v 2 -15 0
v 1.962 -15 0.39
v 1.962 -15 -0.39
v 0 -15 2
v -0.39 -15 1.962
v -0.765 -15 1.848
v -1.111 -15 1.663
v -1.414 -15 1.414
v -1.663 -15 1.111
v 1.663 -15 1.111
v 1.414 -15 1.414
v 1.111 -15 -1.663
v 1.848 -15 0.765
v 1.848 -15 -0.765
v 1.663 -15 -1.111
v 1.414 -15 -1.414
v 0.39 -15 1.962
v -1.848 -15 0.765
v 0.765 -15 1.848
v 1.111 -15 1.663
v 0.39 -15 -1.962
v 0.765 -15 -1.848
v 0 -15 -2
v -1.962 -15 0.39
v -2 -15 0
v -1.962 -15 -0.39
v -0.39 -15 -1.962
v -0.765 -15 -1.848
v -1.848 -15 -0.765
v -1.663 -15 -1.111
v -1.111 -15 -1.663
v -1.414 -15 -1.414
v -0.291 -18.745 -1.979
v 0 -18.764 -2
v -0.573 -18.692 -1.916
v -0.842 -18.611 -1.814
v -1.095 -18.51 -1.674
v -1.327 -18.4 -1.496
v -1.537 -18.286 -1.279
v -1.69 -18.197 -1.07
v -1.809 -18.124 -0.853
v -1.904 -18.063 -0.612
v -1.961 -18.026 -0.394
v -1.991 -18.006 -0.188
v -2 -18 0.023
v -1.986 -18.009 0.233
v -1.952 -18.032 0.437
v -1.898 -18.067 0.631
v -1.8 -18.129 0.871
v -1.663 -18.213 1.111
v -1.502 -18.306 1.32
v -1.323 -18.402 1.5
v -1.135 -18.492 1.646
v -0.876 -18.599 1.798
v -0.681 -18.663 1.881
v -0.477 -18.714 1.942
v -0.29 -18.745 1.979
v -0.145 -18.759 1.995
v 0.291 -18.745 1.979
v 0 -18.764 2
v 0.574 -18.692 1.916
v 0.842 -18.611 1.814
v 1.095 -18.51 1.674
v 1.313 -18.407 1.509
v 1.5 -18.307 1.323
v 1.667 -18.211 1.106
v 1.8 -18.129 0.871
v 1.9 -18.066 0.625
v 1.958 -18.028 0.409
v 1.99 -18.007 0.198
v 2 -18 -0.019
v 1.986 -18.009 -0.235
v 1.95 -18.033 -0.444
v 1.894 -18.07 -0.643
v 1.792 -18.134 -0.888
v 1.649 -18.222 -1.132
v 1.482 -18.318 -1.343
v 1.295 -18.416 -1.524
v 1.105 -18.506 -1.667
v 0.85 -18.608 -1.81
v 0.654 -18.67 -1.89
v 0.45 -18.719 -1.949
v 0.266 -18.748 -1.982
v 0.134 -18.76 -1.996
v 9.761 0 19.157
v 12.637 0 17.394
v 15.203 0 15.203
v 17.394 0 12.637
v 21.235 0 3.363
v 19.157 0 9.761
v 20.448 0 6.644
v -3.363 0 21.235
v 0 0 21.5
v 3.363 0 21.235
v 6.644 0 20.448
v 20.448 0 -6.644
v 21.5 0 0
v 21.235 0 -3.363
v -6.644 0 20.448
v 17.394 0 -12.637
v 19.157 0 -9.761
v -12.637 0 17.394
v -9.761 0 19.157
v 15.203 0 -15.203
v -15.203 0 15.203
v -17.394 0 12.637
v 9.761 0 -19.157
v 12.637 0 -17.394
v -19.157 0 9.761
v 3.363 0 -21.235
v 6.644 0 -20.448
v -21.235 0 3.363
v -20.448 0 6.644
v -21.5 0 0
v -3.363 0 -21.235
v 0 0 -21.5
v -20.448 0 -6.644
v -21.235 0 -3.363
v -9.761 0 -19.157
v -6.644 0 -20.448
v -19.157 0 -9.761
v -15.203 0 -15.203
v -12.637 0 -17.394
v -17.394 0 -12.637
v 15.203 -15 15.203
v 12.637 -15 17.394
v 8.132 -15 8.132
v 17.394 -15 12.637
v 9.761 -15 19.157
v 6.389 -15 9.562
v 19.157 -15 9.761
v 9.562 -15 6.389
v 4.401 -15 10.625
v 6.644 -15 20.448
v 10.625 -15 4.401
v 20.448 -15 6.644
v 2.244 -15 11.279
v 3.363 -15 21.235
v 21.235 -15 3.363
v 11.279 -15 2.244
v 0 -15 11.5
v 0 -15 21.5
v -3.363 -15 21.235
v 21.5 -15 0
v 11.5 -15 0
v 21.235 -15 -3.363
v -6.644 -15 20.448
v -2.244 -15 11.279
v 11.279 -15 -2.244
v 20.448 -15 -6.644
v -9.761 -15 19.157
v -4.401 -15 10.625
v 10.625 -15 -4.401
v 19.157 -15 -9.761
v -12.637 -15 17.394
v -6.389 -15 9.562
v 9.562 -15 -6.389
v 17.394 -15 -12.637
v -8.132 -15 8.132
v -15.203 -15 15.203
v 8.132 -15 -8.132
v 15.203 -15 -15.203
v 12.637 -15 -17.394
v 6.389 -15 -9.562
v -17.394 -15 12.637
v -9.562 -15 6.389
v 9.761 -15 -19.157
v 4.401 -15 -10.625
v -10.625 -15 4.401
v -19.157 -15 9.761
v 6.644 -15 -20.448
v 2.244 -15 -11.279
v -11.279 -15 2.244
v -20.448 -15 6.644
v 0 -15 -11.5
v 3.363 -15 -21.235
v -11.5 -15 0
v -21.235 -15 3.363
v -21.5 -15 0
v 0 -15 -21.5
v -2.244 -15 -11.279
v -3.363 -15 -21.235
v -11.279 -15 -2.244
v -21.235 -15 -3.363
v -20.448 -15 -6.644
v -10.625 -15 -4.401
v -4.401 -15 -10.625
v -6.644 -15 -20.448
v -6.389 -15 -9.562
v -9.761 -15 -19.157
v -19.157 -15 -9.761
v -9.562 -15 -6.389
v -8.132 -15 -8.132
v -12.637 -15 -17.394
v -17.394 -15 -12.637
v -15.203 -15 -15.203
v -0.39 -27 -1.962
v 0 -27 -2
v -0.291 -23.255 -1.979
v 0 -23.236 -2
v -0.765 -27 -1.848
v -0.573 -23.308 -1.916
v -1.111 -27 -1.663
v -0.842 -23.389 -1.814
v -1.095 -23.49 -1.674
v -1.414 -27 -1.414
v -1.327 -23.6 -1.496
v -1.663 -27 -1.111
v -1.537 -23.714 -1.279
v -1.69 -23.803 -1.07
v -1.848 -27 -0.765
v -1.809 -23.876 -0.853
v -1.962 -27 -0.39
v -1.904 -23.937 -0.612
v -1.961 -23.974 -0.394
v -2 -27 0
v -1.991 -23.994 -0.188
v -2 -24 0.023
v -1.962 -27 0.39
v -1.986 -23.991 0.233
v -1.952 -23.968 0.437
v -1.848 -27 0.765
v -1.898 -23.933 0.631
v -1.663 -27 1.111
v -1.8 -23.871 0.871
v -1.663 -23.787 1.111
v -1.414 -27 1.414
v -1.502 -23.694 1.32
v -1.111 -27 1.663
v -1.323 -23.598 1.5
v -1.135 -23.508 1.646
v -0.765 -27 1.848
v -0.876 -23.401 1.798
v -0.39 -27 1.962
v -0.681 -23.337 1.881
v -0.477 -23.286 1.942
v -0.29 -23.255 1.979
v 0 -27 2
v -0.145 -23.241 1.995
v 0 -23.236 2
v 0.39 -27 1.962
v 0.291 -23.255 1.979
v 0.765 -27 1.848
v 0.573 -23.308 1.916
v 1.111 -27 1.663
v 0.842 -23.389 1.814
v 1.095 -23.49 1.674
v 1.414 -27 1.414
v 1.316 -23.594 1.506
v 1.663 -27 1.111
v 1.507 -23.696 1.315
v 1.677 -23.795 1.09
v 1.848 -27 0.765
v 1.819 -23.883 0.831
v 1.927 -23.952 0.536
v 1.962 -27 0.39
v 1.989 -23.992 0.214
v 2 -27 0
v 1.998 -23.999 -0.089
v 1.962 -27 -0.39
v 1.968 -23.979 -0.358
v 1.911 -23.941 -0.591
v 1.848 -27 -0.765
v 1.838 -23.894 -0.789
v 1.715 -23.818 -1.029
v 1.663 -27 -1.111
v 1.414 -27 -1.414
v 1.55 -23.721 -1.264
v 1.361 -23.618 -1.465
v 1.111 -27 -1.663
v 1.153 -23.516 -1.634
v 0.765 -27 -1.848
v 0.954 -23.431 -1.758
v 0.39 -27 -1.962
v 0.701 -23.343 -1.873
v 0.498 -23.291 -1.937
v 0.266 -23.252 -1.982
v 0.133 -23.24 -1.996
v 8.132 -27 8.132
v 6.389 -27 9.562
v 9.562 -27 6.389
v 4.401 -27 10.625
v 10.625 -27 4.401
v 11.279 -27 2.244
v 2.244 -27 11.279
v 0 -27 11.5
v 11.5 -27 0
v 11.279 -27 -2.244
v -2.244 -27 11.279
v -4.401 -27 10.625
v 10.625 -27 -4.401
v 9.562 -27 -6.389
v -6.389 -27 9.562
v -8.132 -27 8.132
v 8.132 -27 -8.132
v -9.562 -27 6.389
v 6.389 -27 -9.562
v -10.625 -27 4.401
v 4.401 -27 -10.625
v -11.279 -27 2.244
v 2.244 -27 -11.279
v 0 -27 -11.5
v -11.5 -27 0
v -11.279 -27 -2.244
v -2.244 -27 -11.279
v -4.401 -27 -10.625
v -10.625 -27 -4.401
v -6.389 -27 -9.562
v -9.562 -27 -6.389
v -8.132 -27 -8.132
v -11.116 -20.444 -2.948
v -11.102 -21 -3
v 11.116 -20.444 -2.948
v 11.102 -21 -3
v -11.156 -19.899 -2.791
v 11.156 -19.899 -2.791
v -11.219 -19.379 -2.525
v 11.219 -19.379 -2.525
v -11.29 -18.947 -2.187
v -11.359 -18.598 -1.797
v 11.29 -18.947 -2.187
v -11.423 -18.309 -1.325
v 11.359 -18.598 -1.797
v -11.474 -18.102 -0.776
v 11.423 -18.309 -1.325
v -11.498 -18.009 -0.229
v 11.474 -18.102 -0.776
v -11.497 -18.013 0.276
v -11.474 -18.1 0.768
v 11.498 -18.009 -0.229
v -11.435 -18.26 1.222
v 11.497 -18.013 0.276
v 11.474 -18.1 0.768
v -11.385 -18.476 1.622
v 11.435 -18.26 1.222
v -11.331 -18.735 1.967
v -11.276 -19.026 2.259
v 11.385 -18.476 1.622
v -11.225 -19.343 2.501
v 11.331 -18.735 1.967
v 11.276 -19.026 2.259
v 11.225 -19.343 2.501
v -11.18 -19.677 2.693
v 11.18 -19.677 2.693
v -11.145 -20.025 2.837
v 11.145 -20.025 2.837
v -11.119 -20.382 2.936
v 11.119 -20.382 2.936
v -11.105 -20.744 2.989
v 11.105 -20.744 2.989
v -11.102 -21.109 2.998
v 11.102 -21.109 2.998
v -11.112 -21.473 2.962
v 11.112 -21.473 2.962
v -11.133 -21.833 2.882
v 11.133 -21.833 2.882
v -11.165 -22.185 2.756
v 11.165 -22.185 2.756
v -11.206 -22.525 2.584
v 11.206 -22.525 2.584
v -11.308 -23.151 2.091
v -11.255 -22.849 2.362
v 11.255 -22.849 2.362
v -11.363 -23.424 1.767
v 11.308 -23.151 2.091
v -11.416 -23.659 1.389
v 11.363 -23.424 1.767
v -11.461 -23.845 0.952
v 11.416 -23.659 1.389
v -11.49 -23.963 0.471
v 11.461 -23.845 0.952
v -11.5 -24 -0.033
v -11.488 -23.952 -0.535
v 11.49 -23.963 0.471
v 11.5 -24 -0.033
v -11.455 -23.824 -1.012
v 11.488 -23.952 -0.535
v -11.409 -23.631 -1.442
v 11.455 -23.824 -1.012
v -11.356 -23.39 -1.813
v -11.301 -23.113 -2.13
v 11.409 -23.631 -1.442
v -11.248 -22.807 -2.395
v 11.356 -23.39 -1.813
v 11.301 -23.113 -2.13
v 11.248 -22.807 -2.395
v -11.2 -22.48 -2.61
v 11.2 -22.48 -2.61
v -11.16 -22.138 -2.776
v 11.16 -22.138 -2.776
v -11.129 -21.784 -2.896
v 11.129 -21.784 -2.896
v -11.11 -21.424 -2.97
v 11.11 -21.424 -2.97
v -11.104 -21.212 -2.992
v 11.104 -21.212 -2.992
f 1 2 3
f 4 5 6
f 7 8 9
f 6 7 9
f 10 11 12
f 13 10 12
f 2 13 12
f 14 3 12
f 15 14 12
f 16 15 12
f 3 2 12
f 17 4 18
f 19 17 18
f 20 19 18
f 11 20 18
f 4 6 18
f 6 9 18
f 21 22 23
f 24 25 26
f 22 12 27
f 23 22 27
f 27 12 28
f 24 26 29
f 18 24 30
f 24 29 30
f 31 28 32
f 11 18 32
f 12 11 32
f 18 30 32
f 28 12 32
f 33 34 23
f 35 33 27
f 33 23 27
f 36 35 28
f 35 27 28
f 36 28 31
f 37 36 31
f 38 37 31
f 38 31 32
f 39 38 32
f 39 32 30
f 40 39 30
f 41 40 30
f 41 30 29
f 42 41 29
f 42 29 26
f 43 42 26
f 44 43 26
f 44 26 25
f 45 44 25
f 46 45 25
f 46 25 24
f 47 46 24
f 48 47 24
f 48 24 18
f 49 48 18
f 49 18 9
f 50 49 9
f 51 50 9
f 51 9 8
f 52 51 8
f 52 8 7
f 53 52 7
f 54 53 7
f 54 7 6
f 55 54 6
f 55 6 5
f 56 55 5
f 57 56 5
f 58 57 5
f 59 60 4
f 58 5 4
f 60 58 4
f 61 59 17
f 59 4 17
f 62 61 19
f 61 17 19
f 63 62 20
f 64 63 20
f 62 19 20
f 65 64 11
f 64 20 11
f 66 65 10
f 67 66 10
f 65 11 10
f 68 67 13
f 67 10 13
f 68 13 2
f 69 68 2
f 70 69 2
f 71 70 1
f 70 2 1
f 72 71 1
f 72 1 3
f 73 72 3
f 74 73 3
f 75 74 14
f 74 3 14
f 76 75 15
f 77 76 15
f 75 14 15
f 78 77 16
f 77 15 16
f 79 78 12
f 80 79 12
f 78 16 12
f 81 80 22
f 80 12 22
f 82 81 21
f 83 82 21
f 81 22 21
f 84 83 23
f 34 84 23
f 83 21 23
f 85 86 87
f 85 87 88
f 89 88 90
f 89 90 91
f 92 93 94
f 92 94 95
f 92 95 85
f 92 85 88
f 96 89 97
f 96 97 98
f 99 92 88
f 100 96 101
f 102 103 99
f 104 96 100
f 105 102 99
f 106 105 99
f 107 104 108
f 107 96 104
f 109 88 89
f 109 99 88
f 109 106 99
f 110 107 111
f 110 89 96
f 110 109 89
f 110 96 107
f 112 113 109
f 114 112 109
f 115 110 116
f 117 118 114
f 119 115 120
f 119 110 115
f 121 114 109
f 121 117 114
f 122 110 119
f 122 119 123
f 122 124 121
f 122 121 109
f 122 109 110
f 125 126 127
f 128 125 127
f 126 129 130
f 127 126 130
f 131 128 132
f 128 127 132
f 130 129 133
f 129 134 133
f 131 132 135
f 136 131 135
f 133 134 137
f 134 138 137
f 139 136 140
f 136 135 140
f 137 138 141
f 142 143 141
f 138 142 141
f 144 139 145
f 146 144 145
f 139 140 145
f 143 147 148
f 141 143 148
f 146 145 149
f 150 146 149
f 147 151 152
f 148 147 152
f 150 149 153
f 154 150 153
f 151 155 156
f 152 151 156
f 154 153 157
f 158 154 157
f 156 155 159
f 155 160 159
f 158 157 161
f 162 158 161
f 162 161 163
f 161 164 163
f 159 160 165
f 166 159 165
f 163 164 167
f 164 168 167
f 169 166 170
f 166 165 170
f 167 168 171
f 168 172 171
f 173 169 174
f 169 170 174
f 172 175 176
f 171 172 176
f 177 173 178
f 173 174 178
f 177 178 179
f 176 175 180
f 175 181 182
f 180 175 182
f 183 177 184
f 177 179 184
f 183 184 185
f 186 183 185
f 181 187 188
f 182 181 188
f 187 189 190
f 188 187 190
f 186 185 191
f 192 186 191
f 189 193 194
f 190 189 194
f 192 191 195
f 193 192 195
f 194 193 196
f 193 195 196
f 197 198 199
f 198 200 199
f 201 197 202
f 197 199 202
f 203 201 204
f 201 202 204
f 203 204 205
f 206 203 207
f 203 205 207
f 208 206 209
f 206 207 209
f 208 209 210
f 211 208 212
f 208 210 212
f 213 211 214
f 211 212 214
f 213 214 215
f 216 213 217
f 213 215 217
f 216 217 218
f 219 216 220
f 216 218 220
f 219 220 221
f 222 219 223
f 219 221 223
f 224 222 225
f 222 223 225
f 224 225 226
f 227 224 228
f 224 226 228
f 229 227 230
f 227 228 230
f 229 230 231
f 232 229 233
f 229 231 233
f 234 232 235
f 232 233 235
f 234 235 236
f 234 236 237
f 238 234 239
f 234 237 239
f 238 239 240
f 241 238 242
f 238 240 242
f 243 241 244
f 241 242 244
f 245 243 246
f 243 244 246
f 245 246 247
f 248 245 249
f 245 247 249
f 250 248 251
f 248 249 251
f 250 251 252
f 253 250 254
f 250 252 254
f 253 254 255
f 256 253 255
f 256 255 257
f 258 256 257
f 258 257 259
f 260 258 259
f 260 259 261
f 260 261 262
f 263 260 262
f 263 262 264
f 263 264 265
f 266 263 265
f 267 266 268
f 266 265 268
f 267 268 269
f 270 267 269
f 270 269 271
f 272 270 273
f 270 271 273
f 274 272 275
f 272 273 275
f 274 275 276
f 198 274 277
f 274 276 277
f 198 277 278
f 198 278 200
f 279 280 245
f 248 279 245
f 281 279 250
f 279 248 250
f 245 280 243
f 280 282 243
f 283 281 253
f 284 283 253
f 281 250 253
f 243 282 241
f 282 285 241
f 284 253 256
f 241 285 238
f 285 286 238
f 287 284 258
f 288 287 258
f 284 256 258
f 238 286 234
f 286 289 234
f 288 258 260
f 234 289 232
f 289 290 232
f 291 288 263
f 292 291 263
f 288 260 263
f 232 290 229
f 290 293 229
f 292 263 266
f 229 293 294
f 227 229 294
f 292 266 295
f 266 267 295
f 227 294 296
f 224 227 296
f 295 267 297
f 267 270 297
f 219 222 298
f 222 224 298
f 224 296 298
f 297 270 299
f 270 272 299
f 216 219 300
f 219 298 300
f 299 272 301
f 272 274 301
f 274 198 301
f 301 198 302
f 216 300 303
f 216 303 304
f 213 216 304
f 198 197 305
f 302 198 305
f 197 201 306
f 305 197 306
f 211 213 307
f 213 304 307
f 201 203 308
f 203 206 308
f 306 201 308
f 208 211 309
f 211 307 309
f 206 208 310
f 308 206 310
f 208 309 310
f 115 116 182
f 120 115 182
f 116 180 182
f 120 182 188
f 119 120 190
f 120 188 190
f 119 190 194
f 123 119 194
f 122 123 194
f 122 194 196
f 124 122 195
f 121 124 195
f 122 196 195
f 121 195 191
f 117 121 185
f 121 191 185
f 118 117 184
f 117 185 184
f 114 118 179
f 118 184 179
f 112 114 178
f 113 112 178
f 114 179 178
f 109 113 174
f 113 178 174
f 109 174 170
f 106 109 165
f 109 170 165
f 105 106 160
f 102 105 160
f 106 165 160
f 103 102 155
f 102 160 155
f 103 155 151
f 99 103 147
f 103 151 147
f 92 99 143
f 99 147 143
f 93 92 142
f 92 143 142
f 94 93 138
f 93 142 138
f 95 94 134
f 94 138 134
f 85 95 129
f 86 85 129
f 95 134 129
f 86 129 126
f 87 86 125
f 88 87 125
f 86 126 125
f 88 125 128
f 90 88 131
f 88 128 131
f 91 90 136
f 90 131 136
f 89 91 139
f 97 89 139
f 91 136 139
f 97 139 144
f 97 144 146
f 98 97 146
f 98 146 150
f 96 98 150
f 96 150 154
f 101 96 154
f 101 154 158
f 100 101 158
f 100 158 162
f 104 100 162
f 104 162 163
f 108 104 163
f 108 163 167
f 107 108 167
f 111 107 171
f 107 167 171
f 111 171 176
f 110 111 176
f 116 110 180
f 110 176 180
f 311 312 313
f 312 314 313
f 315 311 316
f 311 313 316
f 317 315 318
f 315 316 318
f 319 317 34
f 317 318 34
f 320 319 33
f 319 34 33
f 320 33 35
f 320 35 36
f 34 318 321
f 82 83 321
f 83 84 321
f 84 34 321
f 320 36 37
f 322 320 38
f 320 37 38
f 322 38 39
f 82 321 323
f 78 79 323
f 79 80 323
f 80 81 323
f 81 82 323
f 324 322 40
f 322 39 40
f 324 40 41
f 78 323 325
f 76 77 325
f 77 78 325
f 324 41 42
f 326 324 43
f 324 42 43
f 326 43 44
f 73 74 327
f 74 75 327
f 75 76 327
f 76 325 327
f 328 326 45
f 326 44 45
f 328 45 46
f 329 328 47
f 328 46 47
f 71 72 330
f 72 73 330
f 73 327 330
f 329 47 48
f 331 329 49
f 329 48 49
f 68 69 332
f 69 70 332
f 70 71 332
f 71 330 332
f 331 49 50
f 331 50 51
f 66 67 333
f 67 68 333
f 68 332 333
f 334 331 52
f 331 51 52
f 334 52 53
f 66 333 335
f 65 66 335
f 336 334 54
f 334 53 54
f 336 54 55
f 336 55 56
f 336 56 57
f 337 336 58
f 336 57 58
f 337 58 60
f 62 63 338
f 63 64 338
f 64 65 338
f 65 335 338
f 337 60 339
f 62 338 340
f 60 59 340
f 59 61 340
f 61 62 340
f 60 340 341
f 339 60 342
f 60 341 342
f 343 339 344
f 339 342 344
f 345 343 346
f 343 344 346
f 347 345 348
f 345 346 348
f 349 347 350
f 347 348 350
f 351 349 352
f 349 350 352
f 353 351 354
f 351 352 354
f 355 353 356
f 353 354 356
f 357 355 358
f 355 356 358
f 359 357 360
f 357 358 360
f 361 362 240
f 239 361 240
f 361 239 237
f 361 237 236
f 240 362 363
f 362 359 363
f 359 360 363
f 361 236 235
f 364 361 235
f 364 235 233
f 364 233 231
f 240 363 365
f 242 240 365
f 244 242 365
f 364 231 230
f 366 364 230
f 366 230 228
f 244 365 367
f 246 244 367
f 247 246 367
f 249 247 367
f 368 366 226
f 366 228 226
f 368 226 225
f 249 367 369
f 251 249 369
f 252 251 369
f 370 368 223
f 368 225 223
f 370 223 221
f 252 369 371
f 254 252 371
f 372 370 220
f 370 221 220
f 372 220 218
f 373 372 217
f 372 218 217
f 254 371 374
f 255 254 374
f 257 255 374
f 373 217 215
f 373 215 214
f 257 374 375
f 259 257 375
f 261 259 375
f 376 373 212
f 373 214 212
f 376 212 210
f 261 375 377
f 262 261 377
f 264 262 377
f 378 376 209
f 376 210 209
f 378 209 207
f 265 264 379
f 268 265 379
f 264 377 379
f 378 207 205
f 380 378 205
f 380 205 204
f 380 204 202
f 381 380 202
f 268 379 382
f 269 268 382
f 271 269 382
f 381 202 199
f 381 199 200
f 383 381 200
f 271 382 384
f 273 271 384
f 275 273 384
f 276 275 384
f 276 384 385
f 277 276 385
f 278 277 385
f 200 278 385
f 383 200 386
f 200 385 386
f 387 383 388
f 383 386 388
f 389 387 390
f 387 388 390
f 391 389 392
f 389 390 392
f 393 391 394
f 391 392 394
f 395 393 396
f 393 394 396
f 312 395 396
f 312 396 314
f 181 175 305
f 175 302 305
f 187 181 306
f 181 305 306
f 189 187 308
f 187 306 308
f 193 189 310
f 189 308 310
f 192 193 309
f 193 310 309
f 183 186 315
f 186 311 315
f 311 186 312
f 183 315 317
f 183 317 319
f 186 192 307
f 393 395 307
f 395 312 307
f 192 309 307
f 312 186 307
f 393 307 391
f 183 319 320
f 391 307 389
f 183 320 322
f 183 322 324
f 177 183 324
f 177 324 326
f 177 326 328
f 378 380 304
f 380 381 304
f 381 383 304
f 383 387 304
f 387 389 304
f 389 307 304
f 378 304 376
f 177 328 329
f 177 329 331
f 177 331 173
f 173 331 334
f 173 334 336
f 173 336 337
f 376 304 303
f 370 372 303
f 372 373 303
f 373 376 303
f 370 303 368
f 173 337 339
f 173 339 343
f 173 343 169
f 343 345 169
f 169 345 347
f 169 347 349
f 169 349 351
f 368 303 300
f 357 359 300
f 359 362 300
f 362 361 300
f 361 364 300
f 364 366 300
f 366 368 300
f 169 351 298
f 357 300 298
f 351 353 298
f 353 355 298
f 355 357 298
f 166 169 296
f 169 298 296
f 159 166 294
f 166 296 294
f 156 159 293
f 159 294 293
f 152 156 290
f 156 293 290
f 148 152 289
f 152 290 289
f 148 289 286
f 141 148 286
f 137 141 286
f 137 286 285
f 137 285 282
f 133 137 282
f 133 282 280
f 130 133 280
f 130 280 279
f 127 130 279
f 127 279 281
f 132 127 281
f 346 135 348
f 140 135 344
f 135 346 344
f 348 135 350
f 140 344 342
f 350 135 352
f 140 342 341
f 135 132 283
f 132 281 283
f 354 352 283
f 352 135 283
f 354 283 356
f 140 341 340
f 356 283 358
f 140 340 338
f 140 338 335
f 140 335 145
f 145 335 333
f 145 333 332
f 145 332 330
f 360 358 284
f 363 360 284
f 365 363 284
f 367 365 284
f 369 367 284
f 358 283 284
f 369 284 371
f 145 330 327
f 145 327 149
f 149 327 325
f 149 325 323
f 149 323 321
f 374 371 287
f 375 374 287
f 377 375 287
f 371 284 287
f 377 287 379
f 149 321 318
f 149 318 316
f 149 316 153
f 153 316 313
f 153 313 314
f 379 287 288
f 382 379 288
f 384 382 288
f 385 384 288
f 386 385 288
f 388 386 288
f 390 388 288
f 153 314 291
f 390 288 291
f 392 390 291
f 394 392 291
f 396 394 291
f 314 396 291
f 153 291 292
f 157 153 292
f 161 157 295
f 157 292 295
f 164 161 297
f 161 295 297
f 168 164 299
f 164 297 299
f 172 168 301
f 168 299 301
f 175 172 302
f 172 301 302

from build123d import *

# Parameters (mm, degrees)
SKETCH4_R               = 3
CUT_EXTRUDE2_DEPTH      = 15
CUT_EXTRUDE2_DEPTH_BACK = 13


with BuildPart() as part:
    # Sketch1 → Revolve1 (revolve)
    with BuildSketch(Plane(origin=(0, 0, 0), x_dir=(0, 0, -1), z_dir=(1, 0, 0))):
        Polygon((2, 0), (21.5, 0), (21.5, -15), (11.5, -15), (11.5, -27), (2, -27), (2, -15), (0, -15), (0, 0), align=None)
    revolve(axis=Axis((0, 0, 0), (0, 1, 0)))

    # Sketch4 → Cut-Extrude2 (cut, two sides)
    with BuildSketch(Plane(origin=(0, 0, 0), x_dir=(0, 0, -1), z_dir=(1, 0, 0))) as cut_extrude2_sk:
        with Locations((0, -21)):
            Circle(SKETCH4_R)
    extrude(amount=CUT_EXTRUDE2_DEPTH, mode=Mode.SUBTRACT)
    extrude(cut_extrude2_sk.sketch, amount=-CUT_EXTRUDE2_DEPTH_BACK, mode=Mode.SUBTRACT)


solid = part.part
